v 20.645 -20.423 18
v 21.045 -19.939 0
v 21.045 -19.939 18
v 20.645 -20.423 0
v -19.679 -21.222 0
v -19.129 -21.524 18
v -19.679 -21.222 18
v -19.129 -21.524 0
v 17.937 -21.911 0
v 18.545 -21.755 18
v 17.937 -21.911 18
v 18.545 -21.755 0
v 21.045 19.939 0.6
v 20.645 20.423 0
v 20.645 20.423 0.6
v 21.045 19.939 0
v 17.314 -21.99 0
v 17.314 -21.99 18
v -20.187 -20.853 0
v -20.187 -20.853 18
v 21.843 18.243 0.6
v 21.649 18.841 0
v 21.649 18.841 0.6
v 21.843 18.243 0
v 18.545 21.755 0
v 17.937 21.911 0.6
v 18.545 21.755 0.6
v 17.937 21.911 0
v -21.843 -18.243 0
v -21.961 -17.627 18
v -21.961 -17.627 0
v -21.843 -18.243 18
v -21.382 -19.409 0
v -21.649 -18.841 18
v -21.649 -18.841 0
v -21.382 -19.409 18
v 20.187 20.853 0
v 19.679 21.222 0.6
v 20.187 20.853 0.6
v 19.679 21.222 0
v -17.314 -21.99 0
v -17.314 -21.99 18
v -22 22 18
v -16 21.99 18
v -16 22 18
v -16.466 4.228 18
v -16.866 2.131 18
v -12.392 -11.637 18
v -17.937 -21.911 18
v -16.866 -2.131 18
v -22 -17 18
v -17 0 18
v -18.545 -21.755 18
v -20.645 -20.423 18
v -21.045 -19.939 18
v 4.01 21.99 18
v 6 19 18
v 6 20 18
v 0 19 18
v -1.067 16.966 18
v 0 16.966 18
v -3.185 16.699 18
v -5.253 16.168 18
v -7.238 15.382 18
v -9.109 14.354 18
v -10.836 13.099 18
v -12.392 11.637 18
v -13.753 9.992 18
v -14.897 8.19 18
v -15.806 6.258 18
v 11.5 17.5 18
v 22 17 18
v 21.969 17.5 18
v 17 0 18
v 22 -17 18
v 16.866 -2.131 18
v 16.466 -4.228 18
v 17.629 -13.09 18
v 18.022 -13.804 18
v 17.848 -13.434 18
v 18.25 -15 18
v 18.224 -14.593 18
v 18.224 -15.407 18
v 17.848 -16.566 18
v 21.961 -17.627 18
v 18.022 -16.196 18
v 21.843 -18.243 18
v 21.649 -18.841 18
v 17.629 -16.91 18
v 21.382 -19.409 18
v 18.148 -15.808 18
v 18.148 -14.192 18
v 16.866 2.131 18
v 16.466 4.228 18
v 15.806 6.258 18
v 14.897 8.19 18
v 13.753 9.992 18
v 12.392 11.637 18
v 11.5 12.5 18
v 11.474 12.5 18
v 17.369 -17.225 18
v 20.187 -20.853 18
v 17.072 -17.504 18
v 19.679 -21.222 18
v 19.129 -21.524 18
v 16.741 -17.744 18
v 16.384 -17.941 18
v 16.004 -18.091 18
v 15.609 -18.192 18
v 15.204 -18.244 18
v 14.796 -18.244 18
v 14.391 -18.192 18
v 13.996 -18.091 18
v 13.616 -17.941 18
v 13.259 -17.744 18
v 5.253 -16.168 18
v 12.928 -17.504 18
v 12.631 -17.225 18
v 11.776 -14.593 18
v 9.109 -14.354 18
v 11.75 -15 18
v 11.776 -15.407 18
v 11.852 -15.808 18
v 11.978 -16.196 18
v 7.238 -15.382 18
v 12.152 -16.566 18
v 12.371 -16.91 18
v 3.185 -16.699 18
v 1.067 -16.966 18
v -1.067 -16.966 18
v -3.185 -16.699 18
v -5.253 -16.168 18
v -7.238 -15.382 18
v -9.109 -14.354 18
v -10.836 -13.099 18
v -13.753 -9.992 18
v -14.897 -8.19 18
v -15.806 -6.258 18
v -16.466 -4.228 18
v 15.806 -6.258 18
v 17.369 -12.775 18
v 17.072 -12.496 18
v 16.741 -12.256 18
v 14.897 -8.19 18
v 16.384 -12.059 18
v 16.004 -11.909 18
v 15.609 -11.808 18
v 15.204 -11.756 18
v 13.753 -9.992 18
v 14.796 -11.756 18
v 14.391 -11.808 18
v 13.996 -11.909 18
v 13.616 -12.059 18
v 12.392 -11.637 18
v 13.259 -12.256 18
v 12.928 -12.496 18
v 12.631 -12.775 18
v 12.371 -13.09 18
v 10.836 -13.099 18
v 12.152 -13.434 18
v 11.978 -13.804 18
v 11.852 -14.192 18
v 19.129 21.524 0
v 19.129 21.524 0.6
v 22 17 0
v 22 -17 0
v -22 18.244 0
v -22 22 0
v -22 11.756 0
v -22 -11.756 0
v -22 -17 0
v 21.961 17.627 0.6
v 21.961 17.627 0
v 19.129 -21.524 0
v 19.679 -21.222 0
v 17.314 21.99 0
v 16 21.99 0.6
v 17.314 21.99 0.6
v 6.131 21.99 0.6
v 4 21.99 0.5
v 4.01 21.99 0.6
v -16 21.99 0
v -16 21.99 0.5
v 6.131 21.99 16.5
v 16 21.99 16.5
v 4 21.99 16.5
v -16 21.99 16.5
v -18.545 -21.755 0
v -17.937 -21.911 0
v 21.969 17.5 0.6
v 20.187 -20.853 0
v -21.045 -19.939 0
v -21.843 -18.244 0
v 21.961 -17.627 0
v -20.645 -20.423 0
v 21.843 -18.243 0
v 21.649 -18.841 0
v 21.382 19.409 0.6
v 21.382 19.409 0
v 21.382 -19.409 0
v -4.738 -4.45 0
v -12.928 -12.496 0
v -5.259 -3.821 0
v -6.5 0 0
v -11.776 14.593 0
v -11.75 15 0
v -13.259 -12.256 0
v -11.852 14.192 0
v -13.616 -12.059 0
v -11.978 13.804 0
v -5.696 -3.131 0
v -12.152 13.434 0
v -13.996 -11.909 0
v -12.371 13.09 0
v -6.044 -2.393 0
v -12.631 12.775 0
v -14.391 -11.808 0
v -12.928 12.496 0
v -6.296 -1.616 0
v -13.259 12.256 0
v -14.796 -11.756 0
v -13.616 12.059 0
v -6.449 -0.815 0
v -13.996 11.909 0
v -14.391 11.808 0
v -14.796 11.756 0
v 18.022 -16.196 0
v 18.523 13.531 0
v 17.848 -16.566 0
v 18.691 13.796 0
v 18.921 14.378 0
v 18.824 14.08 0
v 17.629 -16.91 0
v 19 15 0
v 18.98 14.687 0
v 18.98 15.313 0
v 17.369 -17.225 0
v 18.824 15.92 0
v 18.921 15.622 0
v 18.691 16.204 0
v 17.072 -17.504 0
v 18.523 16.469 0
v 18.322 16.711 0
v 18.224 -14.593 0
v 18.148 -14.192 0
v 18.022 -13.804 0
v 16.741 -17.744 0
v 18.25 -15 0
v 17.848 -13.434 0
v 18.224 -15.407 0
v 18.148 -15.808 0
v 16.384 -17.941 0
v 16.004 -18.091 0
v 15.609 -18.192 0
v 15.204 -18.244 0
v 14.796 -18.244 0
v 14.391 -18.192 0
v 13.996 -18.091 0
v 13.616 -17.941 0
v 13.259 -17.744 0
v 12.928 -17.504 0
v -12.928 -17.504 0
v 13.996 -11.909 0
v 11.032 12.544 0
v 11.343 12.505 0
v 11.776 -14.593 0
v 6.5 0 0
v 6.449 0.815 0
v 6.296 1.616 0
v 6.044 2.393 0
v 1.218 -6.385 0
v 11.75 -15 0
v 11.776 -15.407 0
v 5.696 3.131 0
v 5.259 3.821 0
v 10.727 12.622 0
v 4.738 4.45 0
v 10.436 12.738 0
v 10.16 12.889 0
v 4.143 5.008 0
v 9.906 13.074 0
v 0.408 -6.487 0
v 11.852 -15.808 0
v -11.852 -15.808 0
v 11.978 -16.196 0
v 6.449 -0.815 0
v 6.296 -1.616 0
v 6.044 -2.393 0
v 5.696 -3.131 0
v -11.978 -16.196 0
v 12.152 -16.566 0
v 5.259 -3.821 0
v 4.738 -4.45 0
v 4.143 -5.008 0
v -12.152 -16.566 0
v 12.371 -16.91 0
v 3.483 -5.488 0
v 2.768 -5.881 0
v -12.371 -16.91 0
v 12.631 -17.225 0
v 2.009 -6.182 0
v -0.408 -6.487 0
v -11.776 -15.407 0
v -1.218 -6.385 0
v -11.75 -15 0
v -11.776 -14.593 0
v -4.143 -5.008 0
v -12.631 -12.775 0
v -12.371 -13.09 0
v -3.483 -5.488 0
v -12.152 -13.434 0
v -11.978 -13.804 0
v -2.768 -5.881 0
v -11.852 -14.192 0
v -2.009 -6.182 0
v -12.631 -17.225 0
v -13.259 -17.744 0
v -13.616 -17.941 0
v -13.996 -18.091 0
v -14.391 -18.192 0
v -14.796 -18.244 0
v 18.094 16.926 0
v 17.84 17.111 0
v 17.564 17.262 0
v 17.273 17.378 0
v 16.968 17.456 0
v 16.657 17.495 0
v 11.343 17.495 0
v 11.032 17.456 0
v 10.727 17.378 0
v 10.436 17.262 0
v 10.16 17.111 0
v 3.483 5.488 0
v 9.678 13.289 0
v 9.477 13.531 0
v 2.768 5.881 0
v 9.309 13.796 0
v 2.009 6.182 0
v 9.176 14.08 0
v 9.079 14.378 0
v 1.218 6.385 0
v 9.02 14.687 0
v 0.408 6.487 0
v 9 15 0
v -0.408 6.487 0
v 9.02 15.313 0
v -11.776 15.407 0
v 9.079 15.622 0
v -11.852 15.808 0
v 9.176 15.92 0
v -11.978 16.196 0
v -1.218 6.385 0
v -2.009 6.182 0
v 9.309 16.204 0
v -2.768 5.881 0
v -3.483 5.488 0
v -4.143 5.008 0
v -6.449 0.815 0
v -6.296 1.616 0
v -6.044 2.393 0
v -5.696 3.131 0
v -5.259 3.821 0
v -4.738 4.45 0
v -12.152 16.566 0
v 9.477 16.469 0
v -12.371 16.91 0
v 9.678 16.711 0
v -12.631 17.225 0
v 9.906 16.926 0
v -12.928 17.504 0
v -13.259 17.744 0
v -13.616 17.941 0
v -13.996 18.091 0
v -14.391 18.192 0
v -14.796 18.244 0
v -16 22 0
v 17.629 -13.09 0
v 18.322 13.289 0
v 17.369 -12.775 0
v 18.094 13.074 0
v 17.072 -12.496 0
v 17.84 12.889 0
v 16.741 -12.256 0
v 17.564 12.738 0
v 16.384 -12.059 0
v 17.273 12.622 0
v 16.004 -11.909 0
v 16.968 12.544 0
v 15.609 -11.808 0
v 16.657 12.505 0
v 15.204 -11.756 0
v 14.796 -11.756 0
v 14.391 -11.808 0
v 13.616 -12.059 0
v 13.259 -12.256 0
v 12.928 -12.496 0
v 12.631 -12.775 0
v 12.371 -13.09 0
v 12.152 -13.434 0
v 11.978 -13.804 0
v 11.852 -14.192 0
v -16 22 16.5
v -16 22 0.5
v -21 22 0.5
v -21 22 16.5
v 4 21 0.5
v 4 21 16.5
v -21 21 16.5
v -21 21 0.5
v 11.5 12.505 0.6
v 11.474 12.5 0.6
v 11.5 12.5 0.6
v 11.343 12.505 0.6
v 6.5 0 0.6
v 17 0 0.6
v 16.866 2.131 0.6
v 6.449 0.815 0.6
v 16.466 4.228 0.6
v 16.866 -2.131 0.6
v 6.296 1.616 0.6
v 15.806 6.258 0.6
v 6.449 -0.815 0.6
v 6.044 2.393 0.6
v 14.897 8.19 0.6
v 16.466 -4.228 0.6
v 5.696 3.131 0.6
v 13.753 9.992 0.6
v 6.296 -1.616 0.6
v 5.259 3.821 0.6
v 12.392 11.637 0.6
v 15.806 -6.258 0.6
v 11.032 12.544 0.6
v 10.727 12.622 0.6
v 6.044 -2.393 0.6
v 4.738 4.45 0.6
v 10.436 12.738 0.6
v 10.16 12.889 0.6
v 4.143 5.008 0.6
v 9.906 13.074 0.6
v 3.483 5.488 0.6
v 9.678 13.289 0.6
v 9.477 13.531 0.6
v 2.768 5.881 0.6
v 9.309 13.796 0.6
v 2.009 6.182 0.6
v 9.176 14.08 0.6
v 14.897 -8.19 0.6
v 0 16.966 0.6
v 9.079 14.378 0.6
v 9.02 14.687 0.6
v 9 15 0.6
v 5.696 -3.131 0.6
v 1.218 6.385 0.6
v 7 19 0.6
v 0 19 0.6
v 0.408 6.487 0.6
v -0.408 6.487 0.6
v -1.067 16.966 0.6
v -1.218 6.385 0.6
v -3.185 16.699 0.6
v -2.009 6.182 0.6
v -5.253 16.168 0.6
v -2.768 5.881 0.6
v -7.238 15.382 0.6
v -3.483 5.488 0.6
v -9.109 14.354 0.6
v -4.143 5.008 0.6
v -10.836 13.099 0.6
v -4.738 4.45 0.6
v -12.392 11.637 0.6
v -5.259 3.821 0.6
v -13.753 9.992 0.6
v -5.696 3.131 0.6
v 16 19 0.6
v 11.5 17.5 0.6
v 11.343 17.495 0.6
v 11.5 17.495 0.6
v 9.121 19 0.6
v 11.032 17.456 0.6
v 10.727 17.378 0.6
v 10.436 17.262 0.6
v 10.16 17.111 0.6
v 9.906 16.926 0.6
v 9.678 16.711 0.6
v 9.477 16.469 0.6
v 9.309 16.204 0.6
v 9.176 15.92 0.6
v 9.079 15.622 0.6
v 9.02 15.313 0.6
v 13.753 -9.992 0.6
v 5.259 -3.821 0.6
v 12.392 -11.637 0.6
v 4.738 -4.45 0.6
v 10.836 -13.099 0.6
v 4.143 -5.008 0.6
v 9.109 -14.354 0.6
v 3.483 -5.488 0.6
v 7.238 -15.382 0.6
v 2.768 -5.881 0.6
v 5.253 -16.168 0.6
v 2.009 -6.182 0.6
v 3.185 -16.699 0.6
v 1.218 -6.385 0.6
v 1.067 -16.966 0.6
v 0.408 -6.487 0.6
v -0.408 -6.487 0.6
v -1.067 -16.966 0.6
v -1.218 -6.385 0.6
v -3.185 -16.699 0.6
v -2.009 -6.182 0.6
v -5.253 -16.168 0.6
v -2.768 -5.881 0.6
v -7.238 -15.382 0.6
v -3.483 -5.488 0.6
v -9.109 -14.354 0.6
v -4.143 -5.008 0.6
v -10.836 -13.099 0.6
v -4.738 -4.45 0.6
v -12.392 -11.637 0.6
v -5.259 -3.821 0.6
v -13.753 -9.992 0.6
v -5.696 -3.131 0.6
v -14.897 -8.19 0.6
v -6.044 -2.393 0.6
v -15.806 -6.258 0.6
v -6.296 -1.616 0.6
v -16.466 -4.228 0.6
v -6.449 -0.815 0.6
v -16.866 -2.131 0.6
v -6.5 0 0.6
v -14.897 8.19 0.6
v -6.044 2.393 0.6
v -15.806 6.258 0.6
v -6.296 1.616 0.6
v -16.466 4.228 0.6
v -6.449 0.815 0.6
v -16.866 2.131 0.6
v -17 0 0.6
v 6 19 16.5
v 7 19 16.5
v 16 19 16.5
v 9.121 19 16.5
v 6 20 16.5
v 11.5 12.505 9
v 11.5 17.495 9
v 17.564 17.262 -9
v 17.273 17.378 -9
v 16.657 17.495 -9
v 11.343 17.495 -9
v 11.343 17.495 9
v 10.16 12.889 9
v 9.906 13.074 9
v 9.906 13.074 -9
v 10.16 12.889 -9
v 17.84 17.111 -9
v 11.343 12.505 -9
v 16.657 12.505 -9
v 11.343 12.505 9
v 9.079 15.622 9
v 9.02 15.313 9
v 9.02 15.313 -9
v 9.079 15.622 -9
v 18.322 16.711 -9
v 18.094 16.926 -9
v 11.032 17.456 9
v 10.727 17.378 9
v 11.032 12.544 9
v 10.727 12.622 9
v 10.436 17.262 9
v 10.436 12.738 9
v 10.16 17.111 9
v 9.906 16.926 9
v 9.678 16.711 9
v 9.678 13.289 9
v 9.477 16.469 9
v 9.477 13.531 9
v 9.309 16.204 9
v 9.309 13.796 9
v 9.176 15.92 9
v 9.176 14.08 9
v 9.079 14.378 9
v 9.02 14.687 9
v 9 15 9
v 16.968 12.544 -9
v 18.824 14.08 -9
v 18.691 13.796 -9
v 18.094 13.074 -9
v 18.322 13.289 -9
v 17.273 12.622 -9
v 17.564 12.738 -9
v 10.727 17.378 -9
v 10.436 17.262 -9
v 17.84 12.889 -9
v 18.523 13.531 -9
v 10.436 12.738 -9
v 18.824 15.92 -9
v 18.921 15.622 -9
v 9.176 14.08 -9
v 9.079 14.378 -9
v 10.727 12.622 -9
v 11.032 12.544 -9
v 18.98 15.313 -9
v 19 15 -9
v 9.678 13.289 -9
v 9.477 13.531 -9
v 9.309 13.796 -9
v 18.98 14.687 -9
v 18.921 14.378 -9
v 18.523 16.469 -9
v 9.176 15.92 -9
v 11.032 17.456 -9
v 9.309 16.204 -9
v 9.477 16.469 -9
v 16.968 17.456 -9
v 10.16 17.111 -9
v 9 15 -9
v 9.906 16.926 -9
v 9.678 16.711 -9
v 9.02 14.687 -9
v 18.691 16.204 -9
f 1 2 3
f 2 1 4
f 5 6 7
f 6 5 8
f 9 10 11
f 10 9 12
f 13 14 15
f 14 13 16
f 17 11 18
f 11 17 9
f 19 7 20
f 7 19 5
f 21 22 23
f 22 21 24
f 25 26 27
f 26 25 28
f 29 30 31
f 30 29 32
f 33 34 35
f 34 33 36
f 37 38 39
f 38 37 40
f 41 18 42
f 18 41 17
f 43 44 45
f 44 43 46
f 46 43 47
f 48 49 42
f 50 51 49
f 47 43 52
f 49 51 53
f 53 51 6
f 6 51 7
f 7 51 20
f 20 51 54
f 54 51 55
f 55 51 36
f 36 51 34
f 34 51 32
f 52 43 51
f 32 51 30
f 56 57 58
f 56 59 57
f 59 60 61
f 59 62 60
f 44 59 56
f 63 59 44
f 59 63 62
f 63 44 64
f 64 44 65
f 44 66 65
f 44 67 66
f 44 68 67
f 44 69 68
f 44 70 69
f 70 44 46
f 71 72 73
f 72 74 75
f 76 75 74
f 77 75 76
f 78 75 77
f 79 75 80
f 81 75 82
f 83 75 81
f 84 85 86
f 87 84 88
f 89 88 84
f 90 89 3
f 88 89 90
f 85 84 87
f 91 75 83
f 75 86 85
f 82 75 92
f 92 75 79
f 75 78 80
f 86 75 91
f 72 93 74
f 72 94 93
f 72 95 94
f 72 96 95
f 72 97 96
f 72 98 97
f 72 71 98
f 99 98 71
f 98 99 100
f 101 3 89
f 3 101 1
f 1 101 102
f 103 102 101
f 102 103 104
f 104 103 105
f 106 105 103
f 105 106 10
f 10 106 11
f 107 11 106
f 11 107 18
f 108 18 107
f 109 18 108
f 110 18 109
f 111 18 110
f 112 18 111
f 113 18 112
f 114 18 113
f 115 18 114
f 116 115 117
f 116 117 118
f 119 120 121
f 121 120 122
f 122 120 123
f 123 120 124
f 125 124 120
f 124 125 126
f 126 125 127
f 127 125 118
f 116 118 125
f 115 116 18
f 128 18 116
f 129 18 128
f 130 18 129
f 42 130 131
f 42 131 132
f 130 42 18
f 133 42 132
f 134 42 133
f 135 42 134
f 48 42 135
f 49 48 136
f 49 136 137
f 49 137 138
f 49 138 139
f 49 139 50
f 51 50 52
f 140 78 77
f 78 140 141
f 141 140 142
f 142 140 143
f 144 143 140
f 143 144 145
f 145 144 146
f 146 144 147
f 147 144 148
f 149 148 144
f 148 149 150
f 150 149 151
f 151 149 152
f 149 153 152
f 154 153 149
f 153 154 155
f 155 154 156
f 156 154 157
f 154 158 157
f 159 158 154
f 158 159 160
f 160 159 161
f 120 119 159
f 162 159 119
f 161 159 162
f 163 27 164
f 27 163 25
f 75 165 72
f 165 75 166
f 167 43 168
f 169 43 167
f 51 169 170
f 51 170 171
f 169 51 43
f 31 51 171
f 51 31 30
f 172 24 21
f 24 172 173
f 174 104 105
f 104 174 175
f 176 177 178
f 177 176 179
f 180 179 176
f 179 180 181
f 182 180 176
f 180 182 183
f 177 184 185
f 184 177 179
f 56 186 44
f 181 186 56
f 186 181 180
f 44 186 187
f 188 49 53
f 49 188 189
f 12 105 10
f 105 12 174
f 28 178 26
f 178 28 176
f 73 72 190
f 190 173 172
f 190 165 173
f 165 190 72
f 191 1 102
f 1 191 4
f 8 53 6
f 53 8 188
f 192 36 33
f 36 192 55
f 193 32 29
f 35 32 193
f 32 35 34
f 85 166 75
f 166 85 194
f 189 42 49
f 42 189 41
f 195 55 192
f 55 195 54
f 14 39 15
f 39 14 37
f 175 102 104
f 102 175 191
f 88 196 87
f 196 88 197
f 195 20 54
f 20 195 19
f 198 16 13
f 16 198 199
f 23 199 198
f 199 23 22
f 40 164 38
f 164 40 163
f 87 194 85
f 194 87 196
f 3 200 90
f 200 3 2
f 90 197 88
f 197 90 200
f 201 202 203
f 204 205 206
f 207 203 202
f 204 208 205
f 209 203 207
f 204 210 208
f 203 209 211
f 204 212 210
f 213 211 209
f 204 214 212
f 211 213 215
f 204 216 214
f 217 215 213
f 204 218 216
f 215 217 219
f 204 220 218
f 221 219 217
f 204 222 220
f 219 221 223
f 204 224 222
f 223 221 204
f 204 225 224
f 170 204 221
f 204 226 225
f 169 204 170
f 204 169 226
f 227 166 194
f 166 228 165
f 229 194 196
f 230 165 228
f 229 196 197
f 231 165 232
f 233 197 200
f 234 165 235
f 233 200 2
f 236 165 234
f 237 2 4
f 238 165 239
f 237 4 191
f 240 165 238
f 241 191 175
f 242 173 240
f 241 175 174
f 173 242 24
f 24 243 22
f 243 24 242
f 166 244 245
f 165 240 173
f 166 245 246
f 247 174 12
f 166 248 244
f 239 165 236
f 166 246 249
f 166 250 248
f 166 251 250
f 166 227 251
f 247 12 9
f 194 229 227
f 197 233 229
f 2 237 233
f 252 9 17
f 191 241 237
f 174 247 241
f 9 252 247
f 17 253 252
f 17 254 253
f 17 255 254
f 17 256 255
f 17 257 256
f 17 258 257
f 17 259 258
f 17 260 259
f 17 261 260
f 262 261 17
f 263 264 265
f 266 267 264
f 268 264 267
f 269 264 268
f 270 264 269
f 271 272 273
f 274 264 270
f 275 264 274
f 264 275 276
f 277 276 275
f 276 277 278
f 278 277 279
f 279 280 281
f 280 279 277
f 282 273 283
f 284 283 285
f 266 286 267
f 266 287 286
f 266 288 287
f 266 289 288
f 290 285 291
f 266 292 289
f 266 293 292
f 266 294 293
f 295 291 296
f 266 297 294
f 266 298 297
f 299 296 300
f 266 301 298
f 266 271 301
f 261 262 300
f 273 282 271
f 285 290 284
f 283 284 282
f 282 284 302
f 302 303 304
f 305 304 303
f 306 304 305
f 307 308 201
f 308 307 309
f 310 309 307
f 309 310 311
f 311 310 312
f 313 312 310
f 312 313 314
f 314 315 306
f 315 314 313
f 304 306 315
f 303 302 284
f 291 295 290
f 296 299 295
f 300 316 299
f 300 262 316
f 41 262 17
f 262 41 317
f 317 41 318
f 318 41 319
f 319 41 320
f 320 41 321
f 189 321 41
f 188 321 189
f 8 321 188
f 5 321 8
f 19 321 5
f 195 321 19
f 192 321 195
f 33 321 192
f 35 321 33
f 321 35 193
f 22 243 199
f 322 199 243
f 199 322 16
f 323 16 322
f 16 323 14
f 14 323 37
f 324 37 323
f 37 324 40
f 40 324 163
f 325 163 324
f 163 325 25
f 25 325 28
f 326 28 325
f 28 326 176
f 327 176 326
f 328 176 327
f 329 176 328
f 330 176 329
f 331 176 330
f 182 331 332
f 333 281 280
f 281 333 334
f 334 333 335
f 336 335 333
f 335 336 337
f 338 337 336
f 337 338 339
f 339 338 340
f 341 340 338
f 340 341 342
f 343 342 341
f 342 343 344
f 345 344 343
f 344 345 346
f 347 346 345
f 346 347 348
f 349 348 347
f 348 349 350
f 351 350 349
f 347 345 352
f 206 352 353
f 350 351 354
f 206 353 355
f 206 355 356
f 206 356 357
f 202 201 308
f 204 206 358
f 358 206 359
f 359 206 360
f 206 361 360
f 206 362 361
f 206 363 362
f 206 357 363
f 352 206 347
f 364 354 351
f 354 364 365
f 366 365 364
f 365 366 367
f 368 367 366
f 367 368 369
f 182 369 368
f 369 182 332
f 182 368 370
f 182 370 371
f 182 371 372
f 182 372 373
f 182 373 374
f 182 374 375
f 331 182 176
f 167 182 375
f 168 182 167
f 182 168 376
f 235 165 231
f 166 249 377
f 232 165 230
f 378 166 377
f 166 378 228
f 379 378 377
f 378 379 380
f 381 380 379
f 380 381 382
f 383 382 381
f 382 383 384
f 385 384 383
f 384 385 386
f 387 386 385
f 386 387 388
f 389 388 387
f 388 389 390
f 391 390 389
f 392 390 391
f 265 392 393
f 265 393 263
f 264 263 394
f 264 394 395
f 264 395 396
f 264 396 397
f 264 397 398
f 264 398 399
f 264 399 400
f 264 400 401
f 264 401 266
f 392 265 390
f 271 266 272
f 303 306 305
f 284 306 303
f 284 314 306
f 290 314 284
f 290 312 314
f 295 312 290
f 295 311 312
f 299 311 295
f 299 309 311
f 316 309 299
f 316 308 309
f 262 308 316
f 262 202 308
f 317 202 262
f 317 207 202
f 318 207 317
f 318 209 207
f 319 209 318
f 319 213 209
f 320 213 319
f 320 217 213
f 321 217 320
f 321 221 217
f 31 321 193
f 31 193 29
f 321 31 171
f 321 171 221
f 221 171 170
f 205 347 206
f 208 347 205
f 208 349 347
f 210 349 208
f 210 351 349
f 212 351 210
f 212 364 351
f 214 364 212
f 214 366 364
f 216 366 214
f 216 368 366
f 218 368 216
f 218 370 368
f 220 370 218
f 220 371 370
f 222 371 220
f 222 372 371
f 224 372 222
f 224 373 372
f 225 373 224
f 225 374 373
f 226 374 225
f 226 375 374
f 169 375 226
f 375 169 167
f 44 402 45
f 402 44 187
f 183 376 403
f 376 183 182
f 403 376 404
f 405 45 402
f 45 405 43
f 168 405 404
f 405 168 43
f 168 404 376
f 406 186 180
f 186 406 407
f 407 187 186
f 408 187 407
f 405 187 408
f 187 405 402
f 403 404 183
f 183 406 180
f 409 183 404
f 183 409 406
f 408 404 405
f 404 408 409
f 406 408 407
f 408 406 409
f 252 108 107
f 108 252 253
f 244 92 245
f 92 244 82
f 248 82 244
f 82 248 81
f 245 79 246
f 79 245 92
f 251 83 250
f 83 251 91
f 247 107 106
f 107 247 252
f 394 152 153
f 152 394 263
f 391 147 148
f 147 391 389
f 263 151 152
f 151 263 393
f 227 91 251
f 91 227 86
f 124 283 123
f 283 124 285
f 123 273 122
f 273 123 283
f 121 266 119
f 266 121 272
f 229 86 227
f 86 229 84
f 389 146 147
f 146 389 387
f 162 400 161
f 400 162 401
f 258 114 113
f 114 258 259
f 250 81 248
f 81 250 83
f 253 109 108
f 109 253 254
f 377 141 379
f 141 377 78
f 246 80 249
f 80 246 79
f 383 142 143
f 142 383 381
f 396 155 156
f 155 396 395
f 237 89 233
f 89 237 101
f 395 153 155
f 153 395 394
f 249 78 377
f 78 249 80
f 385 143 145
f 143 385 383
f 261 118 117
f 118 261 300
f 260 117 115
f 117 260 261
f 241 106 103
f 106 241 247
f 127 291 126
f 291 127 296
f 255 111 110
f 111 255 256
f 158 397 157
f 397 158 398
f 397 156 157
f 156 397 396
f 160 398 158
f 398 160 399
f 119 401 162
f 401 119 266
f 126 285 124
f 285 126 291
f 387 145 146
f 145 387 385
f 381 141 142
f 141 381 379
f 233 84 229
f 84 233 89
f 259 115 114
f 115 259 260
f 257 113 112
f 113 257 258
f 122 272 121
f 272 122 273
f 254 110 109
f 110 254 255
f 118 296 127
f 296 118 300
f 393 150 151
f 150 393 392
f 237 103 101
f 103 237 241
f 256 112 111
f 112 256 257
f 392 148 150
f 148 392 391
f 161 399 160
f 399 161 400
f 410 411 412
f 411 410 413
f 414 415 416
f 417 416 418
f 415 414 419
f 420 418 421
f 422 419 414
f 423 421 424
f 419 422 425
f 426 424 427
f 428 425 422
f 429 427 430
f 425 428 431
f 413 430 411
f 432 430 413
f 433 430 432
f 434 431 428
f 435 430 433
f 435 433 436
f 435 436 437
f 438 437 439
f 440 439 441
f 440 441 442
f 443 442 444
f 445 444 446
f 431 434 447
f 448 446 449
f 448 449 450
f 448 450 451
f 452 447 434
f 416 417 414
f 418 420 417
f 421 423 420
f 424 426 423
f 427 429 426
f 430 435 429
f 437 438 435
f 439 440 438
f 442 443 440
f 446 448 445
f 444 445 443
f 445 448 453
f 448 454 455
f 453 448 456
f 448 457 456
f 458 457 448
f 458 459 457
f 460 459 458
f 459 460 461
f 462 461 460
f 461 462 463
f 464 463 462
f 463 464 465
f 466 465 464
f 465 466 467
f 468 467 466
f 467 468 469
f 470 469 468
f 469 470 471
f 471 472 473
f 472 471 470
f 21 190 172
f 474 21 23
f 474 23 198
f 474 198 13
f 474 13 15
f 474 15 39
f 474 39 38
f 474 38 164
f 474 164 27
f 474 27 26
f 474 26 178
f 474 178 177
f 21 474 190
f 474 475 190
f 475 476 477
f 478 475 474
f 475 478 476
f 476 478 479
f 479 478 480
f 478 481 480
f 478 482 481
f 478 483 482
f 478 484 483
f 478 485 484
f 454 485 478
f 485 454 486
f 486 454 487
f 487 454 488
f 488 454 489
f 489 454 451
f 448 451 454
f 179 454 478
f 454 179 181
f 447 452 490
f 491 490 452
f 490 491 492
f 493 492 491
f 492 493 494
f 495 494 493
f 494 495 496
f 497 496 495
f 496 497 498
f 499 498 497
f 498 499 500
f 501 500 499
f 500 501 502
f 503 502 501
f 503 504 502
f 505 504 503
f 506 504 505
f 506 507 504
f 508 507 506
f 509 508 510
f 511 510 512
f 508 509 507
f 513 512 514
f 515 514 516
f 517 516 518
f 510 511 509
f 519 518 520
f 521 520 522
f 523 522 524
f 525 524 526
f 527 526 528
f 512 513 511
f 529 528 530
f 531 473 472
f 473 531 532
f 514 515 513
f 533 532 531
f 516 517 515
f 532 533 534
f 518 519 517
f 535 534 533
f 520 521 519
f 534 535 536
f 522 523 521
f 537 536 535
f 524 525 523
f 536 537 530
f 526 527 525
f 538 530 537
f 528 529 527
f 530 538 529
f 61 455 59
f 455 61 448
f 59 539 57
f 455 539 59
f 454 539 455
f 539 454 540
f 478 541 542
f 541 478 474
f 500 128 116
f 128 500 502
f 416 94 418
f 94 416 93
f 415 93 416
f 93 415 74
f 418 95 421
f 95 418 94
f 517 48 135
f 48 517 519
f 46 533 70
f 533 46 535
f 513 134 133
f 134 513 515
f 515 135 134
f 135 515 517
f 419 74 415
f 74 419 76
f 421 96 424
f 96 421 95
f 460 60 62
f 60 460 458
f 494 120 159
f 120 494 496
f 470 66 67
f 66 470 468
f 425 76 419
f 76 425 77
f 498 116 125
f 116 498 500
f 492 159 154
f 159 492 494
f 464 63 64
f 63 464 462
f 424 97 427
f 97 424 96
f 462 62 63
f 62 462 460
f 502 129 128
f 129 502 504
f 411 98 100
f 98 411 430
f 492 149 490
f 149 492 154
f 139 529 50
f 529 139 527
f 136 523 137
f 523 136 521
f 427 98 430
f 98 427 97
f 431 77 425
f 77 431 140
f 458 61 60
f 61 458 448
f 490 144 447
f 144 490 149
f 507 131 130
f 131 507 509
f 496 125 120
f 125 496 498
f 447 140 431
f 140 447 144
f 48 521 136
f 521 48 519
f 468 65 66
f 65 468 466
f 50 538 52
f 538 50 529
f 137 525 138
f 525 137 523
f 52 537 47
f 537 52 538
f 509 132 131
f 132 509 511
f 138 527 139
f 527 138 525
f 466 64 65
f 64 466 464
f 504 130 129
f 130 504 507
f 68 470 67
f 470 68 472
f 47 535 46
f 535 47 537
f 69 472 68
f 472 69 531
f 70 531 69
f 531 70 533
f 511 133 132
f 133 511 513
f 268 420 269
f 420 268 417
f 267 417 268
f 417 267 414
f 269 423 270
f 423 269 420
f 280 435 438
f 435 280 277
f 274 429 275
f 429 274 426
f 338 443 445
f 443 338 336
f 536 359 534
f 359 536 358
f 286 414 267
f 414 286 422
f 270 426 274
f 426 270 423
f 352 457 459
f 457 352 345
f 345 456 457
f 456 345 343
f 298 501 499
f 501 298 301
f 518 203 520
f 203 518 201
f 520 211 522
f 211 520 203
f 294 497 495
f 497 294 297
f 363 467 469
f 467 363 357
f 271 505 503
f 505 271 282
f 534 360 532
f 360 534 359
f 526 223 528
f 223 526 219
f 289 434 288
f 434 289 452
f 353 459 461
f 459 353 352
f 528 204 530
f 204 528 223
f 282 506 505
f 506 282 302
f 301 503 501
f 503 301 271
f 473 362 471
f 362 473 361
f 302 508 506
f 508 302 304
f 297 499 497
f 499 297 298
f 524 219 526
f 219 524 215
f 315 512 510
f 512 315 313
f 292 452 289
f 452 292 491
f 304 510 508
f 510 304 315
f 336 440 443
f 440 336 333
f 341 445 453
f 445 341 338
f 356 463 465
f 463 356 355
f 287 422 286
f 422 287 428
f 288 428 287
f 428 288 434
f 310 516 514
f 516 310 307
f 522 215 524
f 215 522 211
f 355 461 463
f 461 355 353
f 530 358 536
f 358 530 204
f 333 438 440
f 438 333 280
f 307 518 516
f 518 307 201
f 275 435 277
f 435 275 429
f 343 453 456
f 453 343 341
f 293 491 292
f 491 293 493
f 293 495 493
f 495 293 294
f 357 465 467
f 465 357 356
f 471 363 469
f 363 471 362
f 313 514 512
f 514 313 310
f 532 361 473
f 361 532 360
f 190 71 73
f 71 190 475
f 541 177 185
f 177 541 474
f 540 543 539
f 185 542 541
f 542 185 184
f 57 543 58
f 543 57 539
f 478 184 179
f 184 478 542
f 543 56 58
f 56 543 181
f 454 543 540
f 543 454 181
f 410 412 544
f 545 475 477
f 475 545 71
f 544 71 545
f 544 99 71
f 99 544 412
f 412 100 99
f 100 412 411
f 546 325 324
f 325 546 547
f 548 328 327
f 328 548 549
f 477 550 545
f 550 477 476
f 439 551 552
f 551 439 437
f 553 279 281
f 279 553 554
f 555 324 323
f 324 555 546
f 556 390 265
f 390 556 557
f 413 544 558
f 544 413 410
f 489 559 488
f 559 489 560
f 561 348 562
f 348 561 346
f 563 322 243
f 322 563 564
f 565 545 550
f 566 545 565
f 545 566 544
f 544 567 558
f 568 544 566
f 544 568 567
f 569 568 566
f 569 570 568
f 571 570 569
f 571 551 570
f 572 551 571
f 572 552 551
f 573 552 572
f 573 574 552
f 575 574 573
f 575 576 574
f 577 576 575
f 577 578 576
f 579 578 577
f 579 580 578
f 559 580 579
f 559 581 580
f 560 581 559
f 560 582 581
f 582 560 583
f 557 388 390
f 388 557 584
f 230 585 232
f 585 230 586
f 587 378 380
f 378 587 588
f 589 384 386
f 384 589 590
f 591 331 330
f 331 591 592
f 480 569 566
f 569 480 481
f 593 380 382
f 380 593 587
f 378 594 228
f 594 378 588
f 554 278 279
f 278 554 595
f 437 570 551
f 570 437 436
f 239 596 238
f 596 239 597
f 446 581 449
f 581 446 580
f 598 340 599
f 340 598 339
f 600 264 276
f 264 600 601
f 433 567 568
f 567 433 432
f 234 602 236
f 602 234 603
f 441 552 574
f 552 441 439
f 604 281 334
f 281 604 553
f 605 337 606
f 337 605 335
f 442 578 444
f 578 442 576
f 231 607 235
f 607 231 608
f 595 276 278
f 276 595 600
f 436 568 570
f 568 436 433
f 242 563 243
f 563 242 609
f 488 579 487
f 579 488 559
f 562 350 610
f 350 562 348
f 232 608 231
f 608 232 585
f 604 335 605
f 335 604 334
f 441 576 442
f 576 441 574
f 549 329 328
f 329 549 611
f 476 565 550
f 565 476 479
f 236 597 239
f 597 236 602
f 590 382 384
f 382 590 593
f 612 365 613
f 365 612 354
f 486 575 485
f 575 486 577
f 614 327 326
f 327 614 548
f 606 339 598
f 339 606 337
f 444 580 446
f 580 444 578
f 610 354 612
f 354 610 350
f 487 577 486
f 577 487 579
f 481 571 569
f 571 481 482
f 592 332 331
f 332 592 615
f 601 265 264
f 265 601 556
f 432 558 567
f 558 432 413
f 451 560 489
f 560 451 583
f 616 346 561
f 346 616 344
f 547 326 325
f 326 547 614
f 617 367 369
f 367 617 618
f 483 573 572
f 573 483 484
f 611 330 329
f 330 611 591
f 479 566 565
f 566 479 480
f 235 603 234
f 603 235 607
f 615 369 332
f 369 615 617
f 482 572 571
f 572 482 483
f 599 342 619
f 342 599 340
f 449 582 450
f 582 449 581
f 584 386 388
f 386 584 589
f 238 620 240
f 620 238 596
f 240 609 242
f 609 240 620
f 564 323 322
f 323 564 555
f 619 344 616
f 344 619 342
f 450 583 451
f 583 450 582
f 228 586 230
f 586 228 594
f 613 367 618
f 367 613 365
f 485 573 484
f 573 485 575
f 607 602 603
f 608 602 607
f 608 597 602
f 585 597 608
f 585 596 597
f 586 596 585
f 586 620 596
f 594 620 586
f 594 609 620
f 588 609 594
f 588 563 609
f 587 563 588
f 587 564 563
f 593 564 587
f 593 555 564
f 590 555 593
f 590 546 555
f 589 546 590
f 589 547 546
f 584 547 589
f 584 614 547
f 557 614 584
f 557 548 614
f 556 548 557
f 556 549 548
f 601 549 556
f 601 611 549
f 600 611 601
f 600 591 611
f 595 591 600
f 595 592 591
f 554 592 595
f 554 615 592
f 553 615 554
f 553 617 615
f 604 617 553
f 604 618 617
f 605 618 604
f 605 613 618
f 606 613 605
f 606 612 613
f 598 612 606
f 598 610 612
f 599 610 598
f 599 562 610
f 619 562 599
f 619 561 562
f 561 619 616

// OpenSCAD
$fn = 50;


union() {
	difference() {
		union() {
			hull() {
				translate(v = [-17.0000000000, 17.0000000000, 0]) {
					cylinder(h = 18, r = 5);
				}
				translate(v = [17.0000000000, 17.0000000000, 0]) {
					cylinder(h = 18, r = 5);
				}
				translate(v = [-17.0000000000, -17.0000000000, 0]) {
					cylinder(h = 18, r = 5);
				}
				translate(v = [17.0000000000, -17.0000000000, 0]) {
					cylinder(h = 18, r = 5);
				}
			}
			translate(v = [-22.0000000000, 16.0000000000, 0]) {
				cube(size = [6, 6, 18]);
			}
		}
		union() {
			translate(v = [-22.5000000000, -15.0000000000, -250.0000000000]) {
				rotate(a = [0, 0, 0]) {
					difference() {
						union() {
							hull() {
								translate(v = [7.5000000000, 0, 0]) {
									cylinder(h = 250, r = 3.2500000000, r1 = 3.2500000000, r2 = 3.2500000000);
								}
								translate(v = [-7.5000000000, 0, 0]) {
									cylinder(h = 250, r = 3.2500000000, r1 = 3.2500000000, r2 = 3.2500000000);
								}
							}
						}
						union();
					}
				}
			}
			translate(v = [-22.5000000000, 15.0000000000, -250.0000000000]) {
				rotate(a = [0, 0, 0]) {
					difference() {
						union() {
							hull() {
								translate(v = [7.5000000000, 0, 0]) {
									cylinder(h = 250, r = 3.2500000000, r1 = 3.2500000000, r2 = 3.2500000000);
								}
								translate(v = [-7.5000000000, 0, 0]) {
									cylinder(h = 250, r = 3.2500000000, r1 = 3.2500000000, r2 = 3.2500000000);
								}
							}
						}
						union();
					}
				}
			}
			translate(v = [-21.0000000000, 21.0000000000, 0.5000000000]) {
				cube(size = [25, 1, 16]);
			}
			translate(v = [15.0000000000, -15.0000000000, 0]) {
				cylinder(h = 100, r = 3.2500000000);
			}
			translate(v = [0.0000000000, 11.0000000000, 0.6000000000]) {
				cube(size = [11, 8, 20.4000000000]);
			}
			translate(v = [0, 0, 0.6000000000]) {
				cylinder(h = 20.4000000000, r = 17.0000000000);
			}
			translate(v = [0, 0, -9.0000000000]) {
				cylinder(h = 18, r = 6.5000000000);
			}
			translate(v = [0.0000000000, 17.5000000000, 0.6000000000]) {
				cube(size = [22.0000000000, 1.5000000000, 20.4000000000]);
			}
			translate(v = [16.0000000000, 17.5000000000, 0.6000000000]) {
				cube(size = [6, 4.5000000000, 20.4000000000]);
			}
			translate(v = [6.0000000000, 17.5000000000, 16.5000000000]) {
				cube(size = [16, 4.5000000000, 1.5000000000]);
			}
			translate(v = [3.2500000000, 22.7500000000, 0.6000000000]) {
				rotate(a = [0, 0, -45]) {
					cube(size = [7.5000000000, 1.5000000000, 20.4000000000]);
				}
			}
			translate(v = [2.5000000000, 12.5000000000, 0.6000000000]) {
				cube(size = [9.0000000000, 5, 17.4000000000]);
			}
		}
	}
	union() {
		translate(v = [14, 15.0000000000, -9.0000000000]) {
			rotate(a = [0, 0, 0]) {
				difference() {
					union() {
						#hull() {
							#translate(v = [2.5000000000, 0, 0]) {
								cylinder(h = 18, r = 2.5000000000, r1 = 2.5000000000, r2 = 2.5000000000);
							}
							#translate(v = [-2.5000000000, 0, 0]) {
								cylinder(h = 18, r = 2.5000000000, r1 = 2.5000000000, r2 = 2.5000000000);
							}
						}
					}
					union();
				}
			}
		}
	}
}
